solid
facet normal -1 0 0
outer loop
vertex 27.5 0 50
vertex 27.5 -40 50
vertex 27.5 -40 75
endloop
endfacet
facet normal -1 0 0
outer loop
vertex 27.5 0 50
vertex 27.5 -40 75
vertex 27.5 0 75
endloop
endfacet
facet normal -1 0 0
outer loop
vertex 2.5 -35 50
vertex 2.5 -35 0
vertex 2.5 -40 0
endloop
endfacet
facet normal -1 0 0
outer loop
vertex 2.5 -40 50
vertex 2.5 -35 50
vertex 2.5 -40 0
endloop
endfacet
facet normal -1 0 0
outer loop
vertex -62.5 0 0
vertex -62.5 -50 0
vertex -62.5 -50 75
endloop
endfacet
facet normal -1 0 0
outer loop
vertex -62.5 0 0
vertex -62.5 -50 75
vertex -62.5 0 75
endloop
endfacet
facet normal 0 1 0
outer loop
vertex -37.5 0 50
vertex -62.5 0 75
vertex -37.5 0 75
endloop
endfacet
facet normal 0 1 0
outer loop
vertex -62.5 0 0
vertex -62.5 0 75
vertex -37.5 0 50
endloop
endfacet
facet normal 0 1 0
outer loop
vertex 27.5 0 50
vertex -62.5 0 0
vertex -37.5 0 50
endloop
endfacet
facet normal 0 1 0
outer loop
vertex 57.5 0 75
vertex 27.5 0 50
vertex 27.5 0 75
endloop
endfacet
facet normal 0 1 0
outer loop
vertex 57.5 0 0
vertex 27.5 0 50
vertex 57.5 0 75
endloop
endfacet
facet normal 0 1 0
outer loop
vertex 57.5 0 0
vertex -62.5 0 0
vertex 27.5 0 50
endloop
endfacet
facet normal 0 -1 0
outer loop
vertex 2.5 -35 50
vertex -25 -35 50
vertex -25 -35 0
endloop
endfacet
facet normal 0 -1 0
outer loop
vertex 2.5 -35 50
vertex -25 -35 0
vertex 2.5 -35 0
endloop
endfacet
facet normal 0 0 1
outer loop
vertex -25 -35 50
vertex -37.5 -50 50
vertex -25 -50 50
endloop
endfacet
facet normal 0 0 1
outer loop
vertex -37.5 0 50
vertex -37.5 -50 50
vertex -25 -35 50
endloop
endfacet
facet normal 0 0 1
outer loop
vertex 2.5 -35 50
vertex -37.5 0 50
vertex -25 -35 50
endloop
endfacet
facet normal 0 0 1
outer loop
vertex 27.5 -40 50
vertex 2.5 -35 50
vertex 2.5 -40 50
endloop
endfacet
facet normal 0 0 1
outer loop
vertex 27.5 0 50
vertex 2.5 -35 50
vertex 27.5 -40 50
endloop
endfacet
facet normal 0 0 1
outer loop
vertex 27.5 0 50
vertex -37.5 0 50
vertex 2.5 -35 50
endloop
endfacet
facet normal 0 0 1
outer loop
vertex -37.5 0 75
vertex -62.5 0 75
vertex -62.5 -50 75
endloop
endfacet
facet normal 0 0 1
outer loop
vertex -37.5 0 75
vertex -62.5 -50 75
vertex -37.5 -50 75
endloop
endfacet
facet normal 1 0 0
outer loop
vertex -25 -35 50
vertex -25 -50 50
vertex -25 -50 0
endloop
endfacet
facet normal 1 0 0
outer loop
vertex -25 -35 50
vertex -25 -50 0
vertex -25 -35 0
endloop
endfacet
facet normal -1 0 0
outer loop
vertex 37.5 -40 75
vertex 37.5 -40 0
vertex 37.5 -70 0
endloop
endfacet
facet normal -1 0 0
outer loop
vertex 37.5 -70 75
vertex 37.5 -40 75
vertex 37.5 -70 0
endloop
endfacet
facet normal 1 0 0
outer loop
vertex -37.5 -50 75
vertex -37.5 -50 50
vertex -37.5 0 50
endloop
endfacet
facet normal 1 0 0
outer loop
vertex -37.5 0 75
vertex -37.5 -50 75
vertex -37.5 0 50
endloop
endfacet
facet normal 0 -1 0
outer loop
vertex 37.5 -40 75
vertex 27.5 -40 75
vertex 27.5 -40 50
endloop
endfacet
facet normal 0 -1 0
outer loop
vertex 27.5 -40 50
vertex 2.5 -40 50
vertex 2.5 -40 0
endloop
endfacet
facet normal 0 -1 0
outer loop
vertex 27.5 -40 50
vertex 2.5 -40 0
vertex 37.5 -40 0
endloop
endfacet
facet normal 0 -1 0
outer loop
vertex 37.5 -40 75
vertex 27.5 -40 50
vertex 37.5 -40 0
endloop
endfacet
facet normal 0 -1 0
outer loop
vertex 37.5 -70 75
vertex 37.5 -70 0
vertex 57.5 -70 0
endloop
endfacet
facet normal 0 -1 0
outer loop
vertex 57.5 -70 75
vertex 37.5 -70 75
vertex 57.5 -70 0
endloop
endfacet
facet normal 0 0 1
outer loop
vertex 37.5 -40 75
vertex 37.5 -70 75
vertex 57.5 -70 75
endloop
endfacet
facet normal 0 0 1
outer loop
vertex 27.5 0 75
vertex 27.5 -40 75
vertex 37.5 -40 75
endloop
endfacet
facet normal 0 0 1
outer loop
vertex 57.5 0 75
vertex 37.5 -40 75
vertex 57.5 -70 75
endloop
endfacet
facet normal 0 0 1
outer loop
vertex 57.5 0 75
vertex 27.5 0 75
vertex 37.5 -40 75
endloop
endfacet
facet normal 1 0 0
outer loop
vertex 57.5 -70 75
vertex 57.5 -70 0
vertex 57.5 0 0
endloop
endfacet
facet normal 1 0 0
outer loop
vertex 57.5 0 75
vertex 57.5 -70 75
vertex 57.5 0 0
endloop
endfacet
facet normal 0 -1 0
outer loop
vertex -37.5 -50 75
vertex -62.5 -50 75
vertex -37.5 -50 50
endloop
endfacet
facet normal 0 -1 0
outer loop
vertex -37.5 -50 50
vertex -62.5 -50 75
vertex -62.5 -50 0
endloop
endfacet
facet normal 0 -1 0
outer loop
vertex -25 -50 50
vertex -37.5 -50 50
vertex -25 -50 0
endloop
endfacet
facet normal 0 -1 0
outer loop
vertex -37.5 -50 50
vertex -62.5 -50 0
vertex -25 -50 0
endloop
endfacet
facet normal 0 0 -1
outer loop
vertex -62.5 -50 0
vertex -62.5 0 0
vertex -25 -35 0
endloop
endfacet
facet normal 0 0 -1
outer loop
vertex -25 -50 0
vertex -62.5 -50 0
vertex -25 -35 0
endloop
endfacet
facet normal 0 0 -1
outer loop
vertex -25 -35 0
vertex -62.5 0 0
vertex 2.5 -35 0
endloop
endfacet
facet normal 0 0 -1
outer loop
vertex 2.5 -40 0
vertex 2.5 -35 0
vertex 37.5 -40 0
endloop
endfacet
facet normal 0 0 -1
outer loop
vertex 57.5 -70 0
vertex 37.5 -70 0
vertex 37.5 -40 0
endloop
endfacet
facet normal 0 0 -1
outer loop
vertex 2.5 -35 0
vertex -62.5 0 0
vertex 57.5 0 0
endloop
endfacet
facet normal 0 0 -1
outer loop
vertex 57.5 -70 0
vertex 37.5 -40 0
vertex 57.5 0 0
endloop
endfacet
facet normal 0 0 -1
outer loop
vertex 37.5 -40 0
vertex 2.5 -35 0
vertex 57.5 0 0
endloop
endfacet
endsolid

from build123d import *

# Parameters (mm, degrees)
F1_DEPTH = 50
F0_W     = 25
F0_H     = 50
F0_W_2   = 10
F0_H_2   = 40
F2_DEPTH = 75


with BuildPart() as f1:
    # F0 (on Top) → F1 (new body)
    with BuildSketch(Plane.XY):
        Polygon((27.5, 0), (-37.5, 0), (-37.5, -50), (-25, -50), (-25, -35), (2.5, -35), (2.5, -40), (27.5, -40), align=None)
    extrude(amount=F1_DEPTH)

    # F0 (on Top) → F2 (join)
    with BuildSketch(Plane.XY):
        with Locations((-50, -25)):
            Rectangle(F0_W, F0_H)
        with Locations((32.5, -20)):
            Rectangle(F0_W_2, F0_H_2)
        Polygon((57.5, 0), (37.5, 0), (37.5, -40), (37.5, -70), (57.5, -70), align=None)
    extrude(amount=F2_DEPTH)


solid = f1.part
